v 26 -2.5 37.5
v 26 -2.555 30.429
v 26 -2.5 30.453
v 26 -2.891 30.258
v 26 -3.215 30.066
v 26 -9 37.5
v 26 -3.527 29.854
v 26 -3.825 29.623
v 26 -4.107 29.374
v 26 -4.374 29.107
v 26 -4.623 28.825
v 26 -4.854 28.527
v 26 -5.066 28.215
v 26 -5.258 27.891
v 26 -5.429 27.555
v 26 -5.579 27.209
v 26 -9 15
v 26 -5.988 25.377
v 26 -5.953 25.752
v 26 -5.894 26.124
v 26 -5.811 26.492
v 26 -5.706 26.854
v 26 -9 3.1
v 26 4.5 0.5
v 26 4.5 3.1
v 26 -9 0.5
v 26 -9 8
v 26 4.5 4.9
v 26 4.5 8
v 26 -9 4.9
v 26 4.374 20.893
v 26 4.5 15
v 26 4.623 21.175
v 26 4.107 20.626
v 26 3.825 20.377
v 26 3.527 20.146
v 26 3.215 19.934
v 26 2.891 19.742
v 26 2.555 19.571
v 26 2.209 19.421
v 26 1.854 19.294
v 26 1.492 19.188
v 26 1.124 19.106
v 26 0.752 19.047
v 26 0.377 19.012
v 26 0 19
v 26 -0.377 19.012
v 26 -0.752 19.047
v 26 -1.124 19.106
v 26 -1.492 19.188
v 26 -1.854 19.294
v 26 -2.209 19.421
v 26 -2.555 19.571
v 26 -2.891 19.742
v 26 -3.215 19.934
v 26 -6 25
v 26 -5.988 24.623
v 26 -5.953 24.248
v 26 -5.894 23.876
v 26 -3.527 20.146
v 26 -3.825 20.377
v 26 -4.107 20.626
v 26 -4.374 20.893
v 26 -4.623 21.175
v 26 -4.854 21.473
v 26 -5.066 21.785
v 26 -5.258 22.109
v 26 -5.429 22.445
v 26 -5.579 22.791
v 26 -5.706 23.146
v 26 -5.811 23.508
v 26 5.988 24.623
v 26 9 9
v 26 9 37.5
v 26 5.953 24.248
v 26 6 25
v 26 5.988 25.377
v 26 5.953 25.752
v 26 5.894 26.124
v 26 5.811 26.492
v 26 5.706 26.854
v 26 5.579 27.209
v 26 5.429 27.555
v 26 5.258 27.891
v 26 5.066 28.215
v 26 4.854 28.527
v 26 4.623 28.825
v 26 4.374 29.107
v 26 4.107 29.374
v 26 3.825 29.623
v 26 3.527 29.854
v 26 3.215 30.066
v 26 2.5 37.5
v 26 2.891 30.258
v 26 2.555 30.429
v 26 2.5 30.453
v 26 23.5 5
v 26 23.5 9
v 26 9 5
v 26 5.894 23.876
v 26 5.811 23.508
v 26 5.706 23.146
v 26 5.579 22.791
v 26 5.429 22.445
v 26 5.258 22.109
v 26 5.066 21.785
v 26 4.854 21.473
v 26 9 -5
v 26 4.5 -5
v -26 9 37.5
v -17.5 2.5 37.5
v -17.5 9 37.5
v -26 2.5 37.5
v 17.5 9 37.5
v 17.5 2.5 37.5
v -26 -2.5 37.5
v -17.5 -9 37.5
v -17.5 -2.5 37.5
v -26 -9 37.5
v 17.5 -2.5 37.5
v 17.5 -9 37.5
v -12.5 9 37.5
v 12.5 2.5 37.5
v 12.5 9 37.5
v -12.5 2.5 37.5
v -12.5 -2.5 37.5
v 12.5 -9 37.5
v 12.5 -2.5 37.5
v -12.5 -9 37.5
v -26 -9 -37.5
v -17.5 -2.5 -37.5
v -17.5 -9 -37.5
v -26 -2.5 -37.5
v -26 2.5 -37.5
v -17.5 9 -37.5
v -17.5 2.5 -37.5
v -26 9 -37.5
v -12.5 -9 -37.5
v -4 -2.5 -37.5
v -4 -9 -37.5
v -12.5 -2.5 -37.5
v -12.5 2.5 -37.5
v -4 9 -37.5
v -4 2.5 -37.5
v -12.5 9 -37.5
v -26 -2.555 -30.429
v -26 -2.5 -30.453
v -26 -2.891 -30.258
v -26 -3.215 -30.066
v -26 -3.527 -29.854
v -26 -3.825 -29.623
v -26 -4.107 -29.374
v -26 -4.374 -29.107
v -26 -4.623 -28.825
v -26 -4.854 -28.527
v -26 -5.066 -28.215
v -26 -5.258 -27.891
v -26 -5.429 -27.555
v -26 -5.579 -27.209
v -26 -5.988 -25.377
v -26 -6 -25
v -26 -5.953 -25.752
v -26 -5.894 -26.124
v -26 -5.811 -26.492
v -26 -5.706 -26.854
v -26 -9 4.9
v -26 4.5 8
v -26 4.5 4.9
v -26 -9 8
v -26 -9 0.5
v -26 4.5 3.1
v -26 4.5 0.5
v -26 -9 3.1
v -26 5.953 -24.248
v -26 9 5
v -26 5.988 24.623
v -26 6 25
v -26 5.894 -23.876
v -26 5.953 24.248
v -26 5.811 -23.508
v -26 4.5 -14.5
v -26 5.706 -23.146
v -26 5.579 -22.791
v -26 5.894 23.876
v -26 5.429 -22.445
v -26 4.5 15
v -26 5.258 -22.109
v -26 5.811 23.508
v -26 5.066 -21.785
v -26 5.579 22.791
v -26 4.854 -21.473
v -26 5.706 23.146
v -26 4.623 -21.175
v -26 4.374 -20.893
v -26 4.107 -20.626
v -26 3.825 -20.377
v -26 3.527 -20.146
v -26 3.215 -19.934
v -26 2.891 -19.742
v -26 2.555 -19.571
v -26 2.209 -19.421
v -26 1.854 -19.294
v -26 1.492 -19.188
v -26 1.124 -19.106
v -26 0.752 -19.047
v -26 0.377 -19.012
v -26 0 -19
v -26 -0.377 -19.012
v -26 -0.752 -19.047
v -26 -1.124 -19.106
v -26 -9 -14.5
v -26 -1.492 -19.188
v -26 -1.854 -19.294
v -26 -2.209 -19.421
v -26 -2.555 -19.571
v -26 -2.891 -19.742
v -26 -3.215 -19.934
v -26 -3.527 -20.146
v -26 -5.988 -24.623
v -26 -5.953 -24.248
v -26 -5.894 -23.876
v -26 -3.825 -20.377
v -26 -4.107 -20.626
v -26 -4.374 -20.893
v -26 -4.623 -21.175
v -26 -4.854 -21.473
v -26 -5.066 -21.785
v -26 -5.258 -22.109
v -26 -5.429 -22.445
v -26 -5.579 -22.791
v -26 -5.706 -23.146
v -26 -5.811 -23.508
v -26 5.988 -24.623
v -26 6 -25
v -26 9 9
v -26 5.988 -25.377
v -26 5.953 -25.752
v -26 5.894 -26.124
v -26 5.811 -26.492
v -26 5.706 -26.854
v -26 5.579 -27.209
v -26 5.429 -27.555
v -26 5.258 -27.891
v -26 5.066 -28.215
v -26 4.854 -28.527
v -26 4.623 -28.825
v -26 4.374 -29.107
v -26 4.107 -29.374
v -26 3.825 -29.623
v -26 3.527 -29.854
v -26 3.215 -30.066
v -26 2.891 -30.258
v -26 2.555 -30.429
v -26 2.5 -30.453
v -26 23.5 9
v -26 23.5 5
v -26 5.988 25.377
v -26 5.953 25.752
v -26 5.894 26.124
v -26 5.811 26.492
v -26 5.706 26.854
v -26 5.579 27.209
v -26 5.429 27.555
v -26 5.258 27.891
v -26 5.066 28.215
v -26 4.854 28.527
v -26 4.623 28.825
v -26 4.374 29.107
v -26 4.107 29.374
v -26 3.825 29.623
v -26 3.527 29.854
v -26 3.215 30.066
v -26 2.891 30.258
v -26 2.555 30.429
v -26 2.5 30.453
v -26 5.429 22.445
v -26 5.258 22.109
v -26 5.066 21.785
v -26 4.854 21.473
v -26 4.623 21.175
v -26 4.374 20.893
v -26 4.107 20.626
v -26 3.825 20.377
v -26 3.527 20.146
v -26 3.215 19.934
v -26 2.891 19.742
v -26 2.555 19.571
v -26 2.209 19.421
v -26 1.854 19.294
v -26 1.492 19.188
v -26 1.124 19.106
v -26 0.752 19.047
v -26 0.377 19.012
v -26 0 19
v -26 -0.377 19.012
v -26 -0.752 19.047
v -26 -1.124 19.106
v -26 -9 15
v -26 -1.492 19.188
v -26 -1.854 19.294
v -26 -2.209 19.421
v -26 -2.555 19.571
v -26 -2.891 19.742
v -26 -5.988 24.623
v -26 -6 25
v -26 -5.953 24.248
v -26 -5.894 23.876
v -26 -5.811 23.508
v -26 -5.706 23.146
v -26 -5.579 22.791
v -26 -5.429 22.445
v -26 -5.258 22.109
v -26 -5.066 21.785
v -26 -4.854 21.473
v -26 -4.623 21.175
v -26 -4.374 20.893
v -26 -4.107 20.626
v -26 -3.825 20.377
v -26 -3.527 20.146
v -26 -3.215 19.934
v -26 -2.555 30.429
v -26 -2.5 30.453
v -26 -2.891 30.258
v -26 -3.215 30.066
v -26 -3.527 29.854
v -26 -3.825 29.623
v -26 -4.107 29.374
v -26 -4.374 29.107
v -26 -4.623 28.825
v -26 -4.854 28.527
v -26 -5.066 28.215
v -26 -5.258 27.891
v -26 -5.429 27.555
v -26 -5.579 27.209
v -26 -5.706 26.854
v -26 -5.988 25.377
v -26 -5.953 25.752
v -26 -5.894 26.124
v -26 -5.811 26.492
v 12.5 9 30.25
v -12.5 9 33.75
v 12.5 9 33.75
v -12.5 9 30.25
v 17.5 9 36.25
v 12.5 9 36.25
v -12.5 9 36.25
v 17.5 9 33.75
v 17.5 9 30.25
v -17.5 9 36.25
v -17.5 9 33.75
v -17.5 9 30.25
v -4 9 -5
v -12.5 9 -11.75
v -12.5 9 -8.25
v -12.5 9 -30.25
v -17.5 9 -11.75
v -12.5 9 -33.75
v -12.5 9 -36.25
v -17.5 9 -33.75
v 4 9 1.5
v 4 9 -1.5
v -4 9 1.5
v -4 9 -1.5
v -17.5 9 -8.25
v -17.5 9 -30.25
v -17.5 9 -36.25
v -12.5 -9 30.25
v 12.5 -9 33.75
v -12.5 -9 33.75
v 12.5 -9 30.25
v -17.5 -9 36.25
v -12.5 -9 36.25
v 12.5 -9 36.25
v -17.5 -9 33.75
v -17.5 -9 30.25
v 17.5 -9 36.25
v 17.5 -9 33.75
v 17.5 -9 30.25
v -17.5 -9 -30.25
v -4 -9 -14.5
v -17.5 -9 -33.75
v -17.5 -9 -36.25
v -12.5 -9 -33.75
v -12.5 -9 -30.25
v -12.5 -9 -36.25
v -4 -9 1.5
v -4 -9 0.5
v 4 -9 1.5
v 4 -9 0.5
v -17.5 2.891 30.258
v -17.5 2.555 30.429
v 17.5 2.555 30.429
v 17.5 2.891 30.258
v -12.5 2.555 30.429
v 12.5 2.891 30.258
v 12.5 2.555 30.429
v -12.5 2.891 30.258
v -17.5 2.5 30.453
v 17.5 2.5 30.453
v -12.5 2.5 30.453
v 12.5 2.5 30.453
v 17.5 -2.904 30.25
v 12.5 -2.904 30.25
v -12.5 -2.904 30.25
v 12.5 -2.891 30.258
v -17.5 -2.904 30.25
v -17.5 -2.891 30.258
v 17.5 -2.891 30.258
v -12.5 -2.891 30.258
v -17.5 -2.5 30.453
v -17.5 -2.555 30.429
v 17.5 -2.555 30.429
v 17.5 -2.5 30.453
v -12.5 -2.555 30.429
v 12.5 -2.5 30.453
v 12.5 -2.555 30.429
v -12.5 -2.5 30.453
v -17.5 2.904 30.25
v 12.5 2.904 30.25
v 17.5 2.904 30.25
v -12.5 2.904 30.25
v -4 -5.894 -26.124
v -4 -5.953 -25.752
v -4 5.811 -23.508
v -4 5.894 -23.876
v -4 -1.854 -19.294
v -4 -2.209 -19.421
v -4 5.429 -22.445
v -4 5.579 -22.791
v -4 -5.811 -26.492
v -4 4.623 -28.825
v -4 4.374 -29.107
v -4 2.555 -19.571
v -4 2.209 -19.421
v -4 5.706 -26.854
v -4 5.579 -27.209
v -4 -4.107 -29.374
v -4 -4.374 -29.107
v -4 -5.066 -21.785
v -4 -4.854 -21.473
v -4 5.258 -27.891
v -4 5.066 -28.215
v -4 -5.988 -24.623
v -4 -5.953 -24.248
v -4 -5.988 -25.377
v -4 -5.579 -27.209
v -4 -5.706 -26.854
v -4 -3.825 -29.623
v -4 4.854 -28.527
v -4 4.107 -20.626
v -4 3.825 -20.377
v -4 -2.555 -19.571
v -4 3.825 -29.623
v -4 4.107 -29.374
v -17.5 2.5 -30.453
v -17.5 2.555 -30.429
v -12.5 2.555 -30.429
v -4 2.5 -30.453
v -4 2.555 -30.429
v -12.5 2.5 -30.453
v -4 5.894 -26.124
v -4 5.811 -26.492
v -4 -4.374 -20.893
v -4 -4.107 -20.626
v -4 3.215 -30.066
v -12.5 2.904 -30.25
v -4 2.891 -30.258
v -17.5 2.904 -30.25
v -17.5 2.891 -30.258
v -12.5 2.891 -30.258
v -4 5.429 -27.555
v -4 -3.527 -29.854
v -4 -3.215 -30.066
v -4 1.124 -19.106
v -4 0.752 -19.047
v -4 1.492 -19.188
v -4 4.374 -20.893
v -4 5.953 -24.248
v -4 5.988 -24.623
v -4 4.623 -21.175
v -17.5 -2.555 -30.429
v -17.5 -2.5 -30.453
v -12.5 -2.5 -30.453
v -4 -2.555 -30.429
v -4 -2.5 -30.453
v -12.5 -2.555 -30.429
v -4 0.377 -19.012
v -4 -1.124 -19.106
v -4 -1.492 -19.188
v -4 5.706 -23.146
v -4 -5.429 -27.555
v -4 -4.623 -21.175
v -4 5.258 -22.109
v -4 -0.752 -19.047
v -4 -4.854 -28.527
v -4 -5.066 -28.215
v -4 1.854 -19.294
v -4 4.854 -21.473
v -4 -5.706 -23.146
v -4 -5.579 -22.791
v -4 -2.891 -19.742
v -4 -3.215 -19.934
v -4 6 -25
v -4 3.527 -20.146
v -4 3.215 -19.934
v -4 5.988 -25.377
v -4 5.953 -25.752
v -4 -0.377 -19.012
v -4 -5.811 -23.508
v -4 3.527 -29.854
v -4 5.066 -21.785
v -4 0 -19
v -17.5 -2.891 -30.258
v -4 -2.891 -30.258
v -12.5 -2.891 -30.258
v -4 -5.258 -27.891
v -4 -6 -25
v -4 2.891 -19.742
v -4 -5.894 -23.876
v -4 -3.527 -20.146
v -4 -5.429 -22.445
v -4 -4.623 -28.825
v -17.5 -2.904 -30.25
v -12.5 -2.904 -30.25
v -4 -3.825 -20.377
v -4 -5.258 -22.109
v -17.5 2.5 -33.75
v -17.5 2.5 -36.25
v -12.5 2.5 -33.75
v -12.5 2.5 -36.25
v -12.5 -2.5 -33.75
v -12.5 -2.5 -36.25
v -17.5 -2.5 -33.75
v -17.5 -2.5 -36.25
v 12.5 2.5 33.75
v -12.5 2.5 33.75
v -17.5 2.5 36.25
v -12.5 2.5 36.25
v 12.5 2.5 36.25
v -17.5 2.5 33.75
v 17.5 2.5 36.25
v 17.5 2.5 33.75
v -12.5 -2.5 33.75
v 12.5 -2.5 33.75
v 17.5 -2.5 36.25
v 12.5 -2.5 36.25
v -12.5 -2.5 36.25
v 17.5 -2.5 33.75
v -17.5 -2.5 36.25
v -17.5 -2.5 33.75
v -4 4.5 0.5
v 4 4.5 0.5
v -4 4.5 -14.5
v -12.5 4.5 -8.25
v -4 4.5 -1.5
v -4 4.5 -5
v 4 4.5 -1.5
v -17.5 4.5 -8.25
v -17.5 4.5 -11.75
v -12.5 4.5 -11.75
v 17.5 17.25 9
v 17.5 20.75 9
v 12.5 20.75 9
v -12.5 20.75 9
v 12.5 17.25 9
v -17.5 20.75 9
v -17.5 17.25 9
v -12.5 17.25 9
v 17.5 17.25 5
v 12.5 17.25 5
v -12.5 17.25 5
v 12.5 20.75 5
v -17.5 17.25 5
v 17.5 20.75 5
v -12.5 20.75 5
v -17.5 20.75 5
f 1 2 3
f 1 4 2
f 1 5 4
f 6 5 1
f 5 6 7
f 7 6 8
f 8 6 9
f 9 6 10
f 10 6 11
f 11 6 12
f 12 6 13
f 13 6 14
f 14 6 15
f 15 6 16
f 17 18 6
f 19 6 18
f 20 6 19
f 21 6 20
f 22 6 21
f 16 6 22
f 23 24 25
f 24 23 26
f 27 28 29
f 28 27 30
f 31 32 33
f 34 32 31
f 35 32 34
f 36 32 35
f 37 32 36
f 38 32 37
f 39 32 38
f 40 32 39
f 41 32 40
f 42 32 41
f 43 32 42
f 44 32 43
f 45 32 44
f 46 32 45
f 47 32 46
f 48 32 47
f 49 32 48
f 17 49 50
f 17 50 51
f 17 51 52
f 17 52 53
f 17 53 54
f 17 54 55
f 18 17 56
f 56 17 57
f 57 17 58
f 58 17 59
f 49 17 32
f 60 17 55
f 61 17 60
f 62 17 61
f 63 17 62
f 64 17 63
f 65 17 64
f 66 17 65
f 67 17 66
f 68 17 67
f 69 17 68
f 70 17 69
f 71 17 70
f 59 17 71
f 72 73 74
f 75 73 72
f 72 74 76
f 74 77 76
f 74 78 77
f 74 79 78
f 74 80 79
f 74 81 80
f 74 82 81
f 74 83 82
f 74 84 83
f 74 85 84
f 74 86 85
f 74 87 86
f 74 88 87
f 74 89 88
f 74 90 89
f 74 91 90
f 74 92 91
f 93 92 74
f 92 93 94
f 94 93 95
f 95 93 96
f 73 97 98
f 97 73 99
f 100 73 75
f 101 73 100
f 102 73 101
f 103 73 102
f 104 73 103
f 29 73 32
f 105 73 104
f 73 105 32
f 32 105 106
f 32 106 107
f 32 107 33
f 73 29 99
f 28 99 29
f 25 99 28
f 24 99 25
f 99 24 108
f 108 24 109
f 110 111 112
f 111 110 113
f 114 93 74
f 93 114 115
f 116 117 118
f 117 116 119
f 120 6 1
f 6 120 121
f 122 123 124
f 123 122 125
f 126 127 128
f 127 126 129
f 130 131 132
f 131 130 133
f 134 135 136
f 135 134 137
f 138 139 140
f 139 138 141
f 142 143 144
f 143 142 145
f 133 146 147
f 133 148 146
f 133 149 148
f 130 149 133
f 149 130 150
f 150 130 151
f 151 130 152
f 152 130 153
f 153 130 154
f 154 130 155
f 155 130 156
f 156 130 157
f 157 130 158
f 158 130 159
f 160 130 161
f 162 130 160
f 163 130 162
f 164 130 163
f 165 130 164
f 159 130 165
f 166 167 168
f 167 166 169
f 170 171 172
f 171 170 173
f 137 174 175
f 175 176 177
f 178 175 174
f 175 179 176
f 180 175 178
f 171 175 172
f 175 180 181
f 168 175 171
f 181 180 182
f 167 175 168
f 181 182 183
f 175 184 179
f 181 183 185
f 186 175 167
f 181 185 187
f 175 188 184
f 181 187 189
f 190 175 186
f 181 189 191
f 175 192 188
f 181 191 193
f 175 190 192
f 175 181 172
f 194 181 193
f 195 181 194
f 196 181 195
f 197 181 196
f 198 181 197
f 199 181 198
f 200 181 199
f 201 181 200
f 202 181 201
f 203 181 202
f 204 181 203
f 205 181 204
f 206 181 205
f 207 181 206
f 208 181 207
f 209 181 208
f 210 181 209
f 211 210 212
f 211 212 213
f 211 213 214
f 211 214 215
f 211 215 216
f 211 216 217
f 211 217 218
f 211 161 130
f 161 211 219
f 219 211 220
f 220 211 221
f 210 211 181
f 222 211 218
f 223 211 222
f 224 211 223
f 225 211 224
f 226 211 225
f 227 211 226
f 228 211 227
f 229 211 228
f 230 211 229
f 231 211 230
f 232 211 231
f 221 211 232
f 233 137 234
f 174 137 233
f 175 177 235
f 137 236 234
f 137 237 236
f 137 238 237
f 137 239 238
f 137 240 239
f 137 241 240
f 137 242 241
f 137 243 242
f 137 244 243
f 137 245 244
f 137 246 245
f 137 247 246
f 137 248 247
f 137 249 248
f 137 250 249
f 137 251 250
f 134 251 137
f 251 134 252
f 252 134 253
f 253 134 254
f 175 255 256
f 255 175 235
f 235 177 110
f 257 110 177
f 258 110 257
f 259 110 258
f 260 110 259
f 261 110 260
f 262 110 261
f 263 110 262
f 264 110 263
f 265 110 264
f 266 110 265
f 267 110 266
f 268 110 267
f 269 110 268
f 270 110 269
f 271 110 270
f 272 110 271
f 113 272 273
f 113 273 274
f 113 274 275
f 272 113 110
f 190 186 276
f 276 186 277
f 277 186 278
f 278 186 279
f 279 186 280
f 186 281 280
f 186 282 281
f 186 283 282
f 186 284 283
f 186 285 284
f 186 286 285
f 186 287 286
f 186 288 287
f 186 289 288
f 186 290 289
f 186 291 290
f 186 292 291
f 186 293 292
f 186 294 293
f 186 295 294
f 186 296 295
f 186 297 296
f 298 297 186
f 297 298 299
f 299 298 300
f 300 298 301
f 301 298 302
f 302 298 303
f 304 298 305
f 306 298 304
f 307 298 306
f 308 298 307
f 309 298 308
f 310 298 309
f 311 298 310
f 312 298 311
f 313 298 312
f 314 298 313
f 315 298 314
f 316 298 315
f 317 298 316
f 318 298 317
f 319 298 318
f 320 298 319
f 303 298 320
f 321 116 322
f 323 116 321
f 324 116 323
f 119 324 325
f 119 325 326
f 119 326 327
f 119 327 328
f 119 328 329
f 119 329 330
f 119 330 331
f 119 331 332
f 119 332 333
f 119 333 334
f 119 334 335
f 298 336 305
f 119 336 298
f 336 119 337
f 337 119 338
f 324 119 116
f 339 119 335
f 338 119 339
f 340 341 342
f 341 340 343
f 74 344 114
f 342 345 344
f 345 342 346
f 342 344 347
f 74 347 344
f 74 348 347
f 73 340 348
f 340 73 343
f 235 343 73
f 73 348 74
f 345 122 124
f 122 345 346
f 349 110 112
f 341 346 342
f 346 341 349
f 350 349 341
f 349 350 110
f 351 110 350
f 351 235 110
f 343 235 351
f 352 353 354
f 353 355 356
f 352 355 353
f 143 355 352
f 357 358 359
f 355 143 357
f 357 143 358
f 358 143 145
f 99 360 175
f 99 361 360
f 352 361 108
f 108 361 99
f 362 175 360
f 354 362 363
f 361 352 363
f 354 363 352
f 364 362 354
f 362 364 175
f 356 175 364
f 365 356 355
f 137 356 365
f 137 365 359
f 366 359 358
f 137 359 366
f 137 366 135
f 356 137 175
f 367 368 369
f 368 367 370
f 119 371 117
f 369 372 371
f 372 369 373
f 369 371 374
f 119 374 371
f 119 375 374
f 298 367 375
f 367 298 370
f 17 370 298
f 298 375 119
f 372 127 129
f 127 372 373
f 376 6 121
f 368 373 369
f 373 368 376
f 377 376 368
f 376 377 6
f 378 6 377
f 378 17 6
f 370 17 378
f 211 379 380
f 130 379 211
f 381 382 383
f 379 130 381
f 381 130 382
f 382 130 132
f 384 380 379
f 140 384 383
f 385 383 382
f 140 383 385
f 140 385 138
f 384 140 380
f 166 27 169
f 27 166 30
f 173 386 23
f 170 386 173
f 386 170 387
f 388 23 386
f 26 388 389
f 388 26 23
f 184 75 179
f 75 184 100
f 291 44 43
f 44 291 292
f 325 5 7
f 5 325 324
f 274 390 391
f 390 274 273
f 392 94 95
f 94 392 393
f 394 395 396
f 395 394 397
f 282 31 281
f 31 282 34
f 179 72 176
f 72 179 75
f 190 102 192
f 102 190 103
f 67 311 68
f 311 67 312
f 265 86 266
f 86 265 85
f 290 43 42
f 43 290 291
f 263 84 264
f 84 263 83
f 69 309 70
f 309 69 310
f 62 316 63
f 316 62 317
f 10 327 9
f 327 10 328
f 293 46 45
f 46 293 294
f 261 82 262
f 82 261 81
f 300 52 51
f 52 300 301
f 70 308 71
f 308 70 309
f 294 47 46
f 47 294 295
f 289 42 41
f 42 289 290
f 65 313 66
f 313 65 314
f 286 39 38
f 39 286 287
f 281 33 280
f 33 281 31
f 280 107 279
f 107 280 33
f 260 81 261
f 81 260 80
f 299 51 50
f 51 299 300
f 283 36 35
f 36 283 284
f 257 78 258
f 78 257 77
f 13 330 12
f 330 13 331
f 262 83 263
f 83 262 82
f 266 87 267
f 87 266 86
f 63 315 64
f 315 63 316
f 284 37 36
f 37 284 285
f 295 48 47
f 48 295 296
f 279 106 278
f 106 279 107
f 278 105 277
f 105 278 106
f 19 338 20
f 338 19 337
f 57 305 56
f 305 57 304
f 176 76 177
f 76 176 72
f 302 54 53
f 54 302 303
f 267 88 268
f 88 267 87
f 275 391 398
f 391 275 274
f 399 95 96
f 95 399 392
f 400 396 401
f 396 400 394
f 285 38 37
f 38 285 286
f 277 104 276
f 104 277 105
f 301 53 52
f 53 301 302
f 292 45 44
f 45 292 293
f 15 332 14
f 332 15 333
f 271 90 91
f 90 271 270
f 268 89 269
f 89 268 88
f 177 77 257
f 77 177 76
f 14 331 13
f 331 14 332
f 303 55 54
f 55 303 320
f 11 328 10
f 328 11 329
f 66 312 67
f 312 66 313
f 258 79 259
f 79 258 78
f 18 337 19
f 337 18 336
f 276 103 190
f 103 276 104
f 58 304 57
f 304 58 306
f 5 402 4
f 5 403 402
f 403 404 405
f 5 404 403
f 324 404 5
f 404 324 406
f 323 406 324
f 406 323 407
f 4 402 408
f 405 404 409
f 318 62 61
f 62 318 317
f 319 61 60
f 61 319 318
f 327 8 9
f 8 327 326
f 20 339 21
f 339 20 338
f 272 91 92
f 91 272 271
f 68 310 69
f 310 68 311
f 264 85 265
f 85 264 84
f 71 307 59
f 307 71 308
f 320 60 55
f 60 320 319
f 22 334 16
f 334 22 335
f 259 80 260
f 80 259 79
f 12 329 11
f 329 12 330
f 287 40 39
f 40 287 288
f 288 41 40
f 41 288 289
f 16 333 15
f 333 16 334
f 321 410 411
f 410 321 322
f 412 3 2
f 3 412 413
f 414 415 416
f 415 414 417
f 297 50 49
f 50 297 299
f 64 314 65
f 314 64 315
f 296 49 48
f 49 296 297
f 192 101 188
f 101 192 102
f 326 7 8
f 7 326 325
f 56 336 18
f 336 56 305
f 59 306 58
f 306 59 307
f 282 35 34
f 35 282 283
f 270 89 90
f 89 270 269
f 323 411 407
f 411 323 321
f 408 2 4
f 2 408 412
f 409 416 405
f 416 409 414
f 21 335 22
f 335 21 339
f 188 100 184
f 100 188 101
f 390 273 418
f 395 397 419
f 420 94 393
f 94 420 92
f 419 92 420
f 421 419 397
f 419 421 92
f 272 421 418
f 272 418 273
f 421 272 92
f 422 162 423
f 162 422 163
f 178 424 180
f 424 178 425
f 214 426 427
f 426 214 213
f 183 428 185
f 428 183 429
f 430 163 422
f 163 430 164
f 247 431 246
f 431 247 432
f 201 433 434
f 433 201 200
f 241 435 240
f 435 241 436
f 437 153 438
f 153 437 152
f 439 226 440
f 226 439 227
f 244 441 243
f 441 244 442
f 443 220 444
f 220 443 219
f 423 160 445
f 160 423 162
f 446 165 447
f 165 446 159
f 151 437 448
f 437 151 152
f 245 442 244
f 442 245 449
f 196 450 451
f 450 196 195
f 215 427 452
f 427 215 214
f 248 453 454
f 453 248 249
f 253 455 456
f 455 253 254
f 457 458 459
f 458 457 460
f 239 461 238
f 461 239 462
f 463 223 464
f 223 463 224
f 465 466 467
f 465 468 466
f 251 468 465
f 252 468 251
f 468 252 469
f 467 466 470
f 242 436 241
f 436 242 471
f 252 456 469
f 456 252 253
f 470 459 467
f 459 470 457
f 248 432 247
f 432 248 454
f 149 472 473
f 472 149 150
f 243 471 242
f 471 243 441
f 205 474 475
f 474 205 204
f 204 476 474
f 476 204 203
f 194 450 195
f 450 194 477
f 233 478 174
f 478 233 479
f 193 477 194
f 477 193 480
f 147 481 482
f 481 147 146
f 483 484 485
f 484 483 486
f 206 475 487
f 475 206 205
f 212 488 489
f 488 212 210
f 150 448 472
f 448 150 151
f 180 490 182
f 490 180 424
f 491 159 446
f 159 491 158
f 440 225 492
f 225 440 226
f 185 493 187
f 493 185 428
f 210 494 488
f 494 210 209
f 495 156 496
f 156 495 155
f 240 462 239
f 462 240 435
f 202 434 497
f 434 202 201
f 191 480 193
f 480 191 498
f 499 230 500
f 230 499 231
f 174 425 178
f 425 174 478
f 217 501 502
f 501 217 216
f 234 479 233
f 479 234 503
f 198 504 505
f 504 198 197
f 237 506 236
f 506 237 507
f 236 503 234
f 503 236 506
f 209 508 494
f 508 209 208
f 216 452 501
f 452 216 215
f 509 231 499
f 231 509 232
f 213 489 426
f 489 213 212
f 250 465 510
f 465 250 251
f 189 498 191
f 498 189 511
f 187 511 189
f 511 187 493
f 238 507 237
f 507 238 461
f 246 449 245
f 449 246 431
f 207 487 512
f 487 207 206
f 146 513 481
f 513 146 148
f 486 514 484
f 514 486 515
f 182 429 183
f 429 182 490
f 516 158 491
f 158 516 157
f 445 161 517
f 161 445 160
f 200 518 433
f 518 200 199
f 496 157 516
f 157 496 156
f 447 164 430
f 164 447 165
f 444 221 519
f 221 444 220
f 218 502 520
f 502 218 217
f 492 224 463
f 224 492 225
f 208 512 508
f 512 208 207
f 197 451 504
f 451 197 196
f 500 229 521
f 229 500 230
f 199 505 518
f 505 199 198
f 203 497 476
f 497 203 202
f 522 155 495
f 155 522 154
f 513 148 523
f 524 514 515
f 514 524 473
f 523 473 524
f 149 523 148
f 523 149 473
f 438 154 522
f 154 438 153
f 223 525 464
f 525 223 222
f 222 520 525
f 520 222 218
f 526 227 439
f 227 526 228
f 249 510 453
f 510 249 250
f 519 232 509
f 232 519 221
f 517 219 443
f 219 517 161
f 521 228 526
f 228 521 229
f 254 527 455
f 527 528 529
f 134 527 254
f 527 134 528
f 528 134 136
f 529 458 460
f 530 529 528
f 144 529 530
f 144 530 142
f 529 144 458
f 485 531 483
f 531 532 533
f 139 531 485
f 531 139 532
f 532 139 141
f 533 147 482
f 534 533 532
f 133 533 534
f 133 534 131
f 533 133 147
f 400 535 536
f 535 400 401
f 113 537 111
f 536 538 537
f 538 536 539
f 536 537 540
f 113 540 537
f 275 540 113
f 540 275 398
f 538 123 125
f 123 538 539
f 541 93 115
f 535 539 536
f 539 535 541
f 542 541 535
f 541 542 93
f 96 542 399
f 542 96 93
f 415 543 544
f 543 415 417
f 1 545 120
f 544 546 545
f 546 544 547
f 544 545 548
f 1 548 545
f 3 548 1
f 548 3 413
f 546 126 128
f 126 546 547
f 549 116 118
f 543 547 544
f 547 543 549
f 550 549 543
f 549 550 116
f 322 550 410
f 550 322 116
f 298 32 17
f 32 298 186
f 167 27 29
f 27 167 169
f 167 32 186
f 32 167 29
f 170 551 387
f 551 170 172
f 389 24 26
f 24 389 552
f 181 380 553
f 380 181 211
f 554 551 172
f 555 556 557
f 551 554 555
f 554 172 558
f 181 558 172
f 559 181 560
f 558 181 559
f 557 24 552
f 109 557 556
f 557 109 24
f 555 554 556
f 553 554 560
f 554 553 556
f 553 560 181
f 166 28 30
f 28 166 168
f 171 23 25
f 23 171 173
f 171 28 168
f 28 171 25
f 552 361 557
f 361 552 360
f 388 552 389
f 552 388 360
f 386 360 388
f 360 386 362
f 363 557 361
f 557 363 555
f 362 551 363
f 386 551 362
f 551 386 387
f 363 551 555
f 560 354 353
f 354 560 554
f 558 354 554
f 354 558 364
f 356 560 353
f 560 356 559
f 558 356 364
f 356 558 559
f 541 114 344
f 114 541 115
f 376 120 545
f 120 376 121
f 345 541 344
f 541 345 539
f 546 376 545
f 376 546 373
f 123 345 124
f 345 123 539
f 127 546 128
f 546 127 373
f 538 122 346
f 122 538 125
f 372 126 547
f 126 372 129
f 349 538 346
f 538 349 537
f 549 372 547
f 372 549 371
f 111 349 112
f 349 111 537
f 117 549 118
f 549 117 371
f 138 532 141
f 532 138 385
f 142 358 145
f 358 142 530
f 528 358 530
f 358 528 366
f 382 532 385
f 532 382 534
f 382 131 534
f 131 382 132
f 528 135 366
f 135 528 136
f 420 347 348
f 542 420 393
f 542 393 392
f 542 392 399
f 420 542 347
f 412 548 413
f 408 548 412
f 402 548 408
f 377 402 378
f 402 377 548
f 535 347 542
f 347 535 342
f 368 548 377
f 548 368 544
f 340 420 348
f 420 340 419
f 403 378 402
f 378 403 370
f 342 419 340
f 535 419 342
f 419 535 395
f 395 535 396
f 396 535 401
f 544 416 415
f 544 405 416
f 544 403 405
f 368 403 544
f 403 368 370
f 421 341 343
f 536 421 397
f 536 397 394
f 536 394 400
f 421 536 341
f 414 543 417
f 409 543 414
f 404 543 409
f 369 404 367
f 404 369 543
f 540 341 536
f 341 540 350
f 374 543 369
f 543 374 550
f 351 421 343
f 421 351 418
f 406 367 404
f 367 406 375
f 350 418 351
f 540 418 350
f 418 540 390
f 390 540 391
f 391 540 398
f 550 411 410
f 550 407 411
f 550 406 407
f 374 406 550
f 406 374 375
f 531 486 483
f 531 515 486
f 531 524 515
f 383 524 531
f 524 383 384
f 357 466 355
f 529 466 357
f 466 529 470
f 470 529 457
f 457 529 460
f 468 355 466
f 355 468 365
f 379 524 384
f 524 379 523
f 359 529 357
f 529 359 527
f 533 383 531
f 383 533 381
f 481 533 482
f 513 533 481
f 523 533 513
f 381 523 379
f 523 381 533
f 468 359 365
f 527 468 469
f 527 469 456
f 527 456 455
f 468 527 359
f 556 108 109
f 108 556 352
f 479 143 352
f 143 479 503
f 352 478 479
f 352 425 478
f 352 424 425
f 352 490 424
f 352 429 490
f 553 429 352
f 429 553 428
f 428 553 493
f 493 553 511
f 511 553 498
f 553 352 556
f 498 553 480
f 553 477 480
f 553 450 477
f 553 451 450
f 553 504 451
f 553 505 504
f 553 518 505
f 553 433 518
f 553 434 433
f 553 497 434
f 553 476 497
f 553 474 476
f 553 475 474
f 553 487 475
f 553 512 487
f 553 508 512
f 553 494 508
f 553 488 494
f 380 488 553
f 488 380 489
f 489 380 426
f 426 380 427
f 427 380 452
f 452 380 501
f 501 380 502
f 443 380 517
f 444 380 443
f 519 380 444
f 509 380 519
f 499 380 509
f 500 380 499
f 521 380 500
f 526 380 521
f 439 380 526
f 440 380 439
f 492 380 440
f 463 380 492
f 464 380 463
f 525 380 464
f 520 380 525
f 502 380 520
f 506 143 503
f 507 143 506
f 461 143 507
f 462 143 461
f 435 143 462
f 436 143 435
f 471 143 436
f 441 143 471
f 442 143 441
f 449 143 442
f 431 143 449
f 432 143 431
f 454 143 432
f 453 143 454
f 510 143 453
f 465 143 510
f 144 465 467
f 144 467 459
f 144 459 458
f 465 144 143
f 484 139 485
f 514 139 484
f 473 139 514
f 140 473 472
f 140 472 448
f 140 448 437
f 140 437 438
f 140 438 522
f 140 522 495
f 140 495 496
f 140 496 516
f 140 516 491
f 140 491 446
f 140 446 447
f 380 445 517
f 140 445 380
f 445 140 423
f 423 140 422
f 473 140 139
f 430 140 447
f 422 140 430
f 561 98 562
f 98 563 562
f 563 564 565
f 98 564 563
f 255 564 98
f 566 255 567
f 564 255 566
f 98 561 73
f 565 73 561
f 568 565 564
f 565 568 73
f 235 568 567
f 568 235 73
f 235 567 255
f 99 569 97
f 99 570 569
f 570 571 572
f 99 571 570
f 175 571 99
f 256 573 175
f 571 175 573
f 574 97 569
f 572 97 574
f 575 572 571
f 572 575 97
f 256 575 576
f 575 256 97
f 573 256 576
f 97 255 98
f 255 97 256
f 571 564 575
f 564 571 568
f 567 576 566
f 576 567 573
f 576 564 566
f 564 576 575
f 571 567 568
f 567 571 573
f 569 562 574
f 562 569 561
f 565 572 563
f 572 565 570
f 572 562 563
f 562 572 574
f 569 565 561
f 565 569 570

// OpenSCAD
// WASABI Niko FDM Printer
// X head mod
// GNU GPL v3
// SANTA no Mix
// https://ameblo.jp/math-physics/theme-10117154956.html
// https://github.com/SantaNoMix/
$fn = 100;
difference () {
    cube ([52,18,75],center = true);

    translate ([0,0,25]) {
        rotate ([0,90,0]) {
            cylinder (55,6,6,center = true);
        }
    }
    translate ([0,0,-25]) {
        rotate ([0,90,0]) {
            cylinder (55,6,6,center = true);
        }
    }
    translate ([0,0,-30]) {
        cube ([60,5,20],center = true);
    }
    translate ([0,0,30]) {
        cube ([60,5,20],center = true);
    }
    translate ([0,-3,11.5]) {
        cube ([60,15,7],center = true);
    }
    translate ([0,-3,-7]) {
        cube ([60,15,15],center = true);
    }
    translate ([0,-3,4]) {
        cube ([60,15,1.8],center = true);
    }
    cube ([8,38,3],center = true);
    translate ([-15,0,-10]) {
        cube ([5,38,3.5],center = true);
    }
    translate ([15,0,38]) {
        cube ([5,38,3.5],center = true);
    }
    translate ([-15,0,38]) {
        cube ([5,38,3.5],center = true);
    }
    translate ([15,0,-38]) {
        cube ([5,38,3.5],center = true);
    }
    translate ([-15,0,-38]) {
        cube ([5,38,3.5],center = true);
    }
    translate ([15,0,32]) {
        cube ([5,38,3.5],center = true);
    }
    translate ([-15,0,32]) {
        cube ([5,38,3.5],center = true);
    }
    translate ([15,0,-32]) {
        cube ([5,38,3.5],center = true);
    }
    translate ([-15,0,-32]) {
        cube ([5,38,3.5],center = true);
    }
    translate ([21,0,-25]) {
        cube ([50,25,40],center = true);
    }
}
difference () {
    translate ([0,16,7]) {
        cube ([52,15,4],center = true);
    }
    translate ([-15,19,10]) {
        cube ([5,3.5,38],center = true);
    }
    translate ([15,19,10]) {
        cube ([5,3.5,38],center = true);
    }
}
